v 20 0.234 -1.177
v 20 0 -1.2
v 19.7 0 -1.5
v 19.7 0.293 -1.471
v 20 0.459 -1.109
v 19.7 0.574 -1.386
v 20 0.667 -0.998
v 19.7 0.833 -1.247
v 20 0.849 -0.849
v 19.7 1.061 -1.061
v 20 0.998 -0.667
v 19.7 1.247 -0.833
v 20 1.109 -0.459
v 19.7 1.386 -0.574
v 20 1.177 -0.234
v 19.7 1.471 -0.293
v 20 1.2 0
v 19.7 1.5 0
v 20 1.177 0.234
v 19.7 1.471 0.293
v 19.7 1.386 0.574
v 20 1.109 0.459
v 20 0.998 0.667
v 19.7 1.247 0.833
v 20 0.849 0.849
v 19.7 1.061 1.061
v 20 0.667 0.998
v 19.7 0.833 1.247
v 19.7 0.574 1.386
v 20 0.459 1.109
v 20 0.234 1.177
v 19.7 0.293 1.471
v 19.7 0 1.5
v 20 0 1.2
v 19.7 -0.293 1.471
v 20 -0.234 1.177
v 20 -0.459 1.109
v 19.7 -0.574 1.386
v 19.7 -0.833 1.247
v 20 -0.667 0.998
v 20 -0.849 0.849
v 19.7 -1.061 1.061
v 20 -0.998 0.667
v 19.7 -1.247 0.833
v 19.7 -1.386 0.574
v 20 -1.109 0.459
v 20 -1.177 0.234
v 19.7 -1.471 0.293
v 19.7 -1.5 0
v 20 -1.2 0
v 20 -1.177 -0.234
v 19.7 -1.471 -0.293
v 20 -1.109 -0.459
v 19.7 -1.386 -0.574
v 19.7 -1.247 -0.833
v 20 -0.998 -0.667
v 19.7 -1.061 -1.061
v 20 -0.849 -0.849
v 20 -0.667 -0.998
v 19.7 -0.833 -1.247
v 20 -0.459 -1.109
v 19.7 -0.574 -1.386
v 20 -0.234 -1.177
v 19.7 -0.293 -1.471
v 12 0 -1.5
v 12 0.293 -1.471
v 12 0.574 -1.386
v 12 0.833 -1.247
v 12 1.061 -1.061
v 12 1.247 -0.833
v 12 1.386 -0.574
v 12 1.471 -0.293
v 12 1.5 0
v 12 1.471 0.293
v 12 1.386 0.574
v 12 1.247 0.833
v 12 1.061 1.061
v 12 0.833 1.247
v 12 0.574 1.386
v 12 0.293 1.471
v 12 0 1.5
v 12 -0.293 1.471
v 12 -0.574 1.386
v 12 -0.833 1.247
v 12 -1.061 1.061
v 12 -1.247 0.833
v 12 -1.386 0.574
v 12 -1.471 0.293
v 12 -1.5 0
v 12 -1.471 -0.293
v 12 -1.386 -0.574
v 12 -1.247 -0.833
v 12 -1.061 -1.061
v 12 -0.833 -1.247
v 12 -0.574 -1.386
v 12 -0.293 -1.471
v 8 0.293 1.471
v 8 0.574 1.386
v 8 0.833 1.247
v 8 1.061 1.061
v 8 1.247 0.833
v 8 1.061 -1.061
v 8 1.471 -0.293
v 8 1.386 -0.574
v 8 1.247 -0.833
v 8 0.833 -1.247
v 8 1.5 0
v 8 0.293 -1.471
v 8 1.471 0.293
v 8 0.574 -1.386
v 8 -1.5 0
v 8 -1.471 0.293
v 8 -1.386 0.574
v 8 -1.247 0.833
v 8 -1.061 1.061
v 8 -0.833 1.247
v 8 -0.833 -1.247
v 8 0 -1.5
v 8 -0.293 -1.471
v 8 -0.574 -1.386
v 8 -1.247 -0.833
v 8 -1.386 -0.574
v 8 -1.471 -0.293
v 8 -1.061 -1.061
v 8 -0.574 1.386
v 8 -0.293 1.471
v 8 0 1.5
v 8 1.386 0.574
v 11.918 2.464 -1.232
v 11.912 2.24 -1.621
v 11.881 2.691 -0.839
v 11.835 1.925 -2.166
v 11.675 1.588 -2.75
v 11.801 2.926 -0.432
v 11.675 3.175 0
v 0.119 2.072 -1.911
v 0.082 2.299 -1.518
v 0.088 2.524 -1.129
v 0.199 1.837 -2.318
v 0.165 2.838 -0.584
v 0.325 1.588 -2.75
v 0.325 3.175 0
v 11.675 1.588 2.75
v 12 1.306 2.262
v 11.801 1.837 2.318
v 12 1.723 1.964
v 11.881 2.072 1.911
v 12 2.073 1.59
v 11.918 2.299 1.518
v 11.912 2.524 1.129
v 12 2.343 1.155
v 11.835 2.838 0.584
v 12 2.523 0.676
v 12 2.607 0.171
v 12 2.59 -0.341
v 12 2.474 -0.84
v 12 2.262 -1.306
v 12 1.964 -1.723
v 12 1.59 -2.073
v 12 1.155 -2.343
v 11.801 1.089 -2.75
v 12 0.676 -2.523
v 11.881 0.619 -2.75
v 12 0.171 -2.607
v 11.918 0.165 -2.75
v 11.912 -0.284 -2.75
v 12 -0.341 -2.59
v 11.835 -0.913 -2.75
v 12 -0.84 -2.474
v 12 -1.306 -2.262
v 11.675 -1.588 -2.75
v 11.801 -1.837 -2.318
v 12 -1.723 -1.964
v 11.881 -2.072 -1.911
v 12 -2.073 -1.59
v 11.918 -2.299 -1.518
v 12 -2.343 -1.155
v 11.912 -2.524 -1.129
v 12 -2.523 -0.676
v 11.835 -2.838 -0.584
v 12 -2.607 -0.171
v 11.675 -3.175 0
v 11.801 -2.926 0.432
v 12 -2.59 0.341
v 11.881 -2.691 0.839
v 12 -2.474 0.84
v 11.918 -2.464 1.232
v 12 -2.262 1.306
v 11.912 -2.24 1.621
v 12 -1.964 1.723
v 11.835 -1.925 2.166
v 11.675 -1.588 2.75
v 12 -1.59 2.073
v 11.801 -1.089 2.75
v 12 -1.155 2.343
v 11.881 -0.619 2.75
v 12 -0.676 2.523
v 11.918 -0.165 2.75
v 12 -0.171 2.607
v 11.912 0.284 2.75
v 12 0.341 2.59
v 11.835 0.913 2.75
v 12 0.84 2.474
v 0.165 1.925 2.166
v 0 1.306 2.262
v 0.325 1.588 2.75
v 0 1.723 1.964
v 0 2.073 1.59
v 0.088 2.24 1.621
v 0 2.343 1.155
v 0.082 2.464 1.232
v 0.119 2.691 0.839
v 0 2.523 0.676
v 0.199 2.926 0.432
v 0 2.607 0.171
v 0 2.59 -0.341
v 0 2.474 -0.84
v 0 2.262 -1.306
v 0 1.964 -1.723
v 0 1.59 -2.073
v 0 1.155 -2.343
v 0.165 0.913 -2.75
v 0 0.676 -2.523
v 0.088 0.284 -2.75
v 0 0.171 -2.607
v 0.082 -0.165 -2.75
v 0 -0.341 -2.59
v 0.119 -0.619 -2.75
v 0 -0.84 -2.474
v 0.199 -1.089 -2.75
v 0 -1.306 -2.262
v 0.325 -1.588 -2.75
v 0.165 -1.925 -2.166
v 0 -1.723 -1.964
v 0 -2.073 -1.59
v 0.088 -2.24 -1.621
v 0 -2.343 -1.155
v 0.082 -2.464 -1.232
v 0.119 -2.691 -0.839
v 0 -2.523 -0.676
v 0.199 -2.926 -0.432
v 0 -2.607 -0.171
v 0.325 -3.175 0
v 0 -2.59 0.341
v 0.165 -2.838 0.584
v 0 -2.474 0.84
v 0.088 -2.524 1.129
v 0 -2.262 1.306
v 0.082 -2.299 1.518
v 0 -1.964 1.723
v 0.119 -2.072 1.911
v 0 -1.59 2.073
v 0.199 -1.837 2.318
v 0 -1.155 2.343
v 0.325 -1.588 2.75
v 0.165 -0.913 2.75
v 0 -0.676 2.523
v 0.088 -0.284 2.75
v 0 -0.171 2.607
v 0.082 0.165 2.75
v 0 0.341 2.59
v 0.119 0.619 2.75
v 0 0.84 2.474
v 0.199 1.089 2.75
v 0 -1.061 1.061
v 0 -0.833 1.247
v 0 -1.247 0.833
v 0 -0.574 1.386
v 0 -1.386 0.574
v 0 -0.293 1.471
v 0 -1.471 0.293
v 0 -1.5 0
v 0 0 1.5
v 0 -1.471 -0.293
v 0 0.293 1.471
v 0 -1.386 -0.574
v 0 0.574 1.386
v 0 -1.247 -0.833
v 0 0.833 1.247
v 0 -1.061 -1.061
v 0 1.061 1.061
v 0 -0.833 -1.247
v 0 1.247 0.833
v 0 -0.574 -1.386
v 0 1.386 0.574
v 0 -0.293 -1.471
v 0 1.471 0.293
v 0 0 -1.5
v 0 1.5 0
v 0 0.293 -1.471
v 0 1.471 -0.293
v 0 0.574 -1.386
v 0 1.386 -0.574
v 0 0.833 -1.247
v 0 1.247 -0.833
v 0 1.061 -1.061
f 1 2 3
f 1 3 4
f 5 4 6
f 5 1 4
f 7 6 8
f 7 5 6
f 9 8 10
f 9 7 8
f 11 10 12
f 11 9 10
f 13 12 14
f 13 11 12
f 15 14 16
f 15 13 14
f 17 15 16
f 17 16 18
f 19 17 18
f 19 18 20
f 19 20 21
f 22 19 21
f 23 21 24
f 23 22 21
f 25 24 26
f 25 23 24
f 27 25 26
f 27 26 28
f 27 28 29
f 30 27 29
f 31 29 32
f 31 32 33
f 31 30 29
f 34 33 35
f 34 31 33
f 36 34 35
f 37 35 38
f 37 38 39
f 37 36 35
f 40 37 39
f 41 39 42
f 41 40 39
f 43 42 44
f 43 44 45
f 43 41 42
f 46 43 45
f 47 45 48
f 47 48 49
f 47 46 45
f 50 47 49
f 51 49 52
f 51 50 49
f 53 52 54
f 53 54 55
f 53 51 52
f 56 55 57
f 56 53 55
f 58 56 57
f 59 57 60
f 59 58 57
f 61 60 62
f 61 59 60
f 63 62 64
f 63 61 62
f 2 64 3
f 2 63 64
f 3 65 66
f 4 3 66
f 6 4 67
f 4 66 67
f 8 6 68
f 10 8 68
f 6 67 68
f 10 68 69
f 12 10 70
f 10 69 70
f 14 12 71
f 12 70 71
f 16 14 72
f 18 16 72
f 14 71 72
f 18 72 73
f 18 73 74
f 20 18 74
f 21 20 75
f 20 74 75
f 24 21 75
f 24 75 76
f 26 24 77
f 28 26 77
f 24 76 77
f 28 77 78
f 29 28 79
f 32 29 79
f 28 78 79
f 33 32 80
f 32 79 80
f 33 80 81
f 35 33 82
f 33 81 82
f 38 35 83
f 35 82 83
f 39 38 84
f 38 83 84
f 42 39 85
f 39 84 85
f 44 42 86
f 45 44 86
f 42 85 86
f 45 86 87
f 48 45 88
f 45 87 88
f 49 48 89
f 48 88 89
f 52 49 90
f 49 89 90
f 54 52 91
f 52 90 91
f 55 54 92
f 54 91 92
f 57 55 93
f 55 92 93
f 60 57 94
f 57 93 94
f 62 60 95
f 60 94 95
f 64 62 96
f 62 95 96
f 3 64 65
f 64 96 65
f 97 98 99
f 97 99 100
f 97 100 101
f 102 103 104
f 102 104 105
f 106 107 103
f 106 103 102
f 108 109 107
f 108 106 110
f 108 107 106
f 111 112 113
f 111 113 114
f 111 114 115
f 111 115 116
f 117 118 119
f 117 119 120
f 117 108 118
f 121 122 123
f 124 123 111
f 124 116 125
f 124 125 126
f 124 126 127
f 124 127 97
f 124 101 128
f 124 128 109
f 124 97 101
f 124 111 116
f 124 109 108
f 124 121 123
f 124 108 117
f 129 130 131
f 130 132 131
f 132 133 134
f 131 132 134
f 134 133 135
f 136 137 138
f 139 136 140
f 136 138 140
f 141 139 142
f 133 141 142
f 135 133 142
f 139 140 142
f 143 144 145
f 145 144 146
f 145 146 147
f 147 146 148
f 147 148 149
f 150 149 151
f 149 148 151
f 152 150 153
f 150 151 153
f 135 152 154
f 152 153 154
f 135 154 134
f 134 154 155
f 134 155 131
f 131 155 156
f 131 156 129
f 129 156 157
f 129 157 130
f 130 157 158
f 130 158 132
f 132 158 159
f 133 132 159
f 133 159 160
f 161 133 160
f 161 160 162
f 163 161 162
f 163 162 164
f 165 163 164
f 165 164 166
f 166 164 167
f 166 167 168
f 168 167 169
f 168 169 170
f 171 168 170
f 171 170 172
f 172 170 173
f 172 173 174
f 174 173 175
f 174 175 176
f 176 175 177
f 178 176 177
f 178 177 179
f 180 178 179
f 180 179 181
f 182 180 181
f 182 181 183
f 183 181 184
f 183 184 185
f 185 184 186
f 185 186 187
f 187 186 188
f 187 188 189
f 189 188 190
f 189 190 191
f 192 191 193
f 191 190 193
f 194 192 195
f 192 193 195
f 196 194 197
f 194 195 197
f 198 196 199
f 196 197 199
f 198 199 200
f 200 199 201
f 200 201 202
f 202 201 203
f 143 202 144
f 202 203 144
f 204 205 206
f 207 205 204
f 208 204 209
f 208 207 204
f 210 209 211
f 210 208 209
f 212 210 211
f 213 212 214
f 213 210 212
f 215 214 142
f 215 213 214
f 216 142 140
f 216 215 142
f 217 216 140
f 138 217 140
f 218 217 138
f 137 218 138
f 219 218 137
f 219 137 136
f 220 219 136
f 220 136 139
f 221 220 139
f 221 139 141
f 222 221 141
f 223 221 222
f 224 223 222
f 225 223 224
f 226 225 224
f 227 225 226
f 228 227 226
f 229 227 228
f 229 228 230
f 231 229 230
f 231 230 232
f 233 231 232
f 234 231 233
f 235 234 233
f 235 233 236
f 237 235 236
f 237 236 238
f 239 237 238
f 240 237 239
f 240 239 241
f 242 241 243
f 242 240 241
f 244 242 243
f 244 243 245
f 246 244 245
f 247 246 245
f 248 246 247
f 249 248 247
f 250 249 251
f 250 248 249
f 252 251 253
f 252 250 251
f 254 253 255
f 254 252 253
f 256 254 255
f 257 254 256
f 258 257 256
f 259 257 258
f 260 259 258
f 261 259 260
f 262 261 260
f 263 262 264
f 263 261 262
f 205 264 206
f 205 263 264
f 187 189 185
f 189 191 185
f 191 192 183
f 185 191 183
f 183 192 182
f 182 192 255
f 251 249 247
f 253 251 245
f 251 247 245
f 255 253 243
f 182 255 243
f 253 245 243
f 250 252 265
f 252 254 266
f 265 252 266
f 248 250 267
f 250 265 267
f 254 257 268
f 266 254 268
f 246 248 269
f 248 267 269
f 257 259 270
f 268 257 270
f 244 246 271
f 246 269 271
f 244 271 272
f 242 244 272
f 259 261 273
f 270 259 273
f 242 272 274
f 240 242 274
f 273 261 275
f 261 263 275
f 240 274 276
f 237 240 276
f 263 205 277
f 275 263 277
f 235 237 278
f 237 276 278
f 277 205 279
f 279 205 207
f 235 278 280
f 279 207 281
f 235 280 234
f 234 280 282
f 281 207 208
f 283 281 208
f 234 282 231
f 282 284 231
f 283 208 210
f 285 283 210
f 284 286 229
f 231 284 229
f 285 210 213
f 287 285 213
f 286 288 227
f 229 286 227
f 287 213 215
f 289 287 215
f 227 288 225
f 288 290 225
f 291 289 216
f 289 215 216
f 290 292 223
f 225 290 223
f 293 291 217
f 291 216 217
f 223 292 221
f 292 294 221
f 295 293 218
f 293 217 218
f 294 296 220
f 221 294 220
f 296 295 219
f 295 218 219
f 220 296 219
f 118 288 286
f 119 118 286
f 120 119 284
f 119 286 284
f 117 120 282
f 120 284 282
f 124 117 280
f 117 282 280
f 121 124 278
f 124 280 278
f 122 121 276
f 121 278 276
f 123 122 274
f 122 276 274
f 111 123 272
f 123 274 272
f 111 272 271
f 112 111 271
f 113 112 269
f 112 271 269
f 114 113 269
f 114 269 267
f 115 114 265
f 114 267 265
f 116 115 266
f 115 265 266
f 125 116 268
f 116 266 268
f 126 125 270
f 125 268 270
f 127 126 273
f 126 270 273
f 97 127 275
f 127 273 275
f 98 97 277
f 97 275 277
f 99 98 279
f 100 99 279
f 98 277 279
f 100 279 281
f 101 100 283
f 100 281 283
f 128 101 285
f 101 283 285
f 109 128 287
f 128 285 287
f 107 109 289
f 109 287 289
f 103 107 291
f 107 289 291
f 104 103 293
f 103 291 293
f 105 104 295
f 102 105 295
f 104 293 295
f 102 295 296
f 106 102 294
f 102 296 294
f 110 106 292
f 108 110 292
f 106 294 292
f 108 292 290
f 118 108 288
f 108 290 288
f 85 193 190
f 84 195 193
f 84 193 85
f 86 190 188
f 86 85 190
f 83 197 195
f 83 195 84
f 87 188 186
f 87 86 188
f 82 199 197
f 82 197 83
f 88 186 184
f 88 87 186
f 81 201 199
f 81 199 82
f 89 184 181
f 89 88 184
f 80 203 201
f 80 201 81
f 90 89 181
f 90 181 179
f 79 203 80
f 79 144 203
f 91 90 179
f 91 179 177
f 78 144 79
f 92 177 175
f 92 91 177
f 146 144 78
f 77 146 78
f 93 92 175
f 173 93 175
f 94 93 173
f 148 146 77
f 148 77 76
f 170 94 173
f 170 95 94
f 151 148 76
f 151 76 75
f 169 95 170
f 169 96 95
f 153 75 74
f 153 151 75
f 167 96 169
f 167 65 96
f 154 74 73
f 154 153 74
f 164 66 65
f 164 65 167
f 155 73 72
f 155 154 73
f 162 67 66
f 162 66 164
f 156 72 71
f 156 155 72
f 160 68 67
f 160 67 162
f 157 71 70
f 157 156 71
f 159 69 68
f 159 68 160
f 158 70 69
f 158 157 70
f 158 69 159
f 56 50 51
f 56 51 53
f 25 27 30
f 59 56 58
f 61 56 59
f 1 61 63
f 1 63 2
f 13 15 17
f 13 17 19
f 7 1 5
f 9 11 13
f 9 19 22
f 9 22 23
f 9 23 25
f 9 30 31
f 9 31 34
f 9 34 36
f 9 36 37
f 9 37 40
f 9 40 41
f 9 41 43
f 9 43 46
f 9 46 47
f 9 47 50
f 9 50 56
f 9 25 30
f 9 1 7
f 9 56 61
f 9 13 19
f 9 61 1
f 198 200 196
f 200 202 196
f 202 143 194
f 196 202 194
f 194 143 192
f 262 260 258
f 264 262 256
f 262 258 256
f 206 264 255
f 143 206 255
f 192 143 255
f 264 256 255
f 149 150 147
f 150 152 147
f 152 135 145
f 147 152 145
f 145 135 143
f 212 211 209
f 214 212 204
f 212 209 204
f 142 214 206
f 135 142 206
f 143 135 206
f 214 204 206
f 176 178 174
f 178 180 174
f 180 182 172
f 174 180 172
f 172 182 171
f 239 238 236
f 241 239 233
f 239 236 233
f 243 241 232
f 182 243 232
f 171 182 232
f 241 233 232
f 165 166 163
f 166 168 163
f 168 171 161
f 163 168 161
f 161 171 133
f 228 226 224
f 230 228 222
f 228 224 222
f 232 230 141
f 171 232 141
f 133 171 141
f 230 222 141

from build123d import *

# Parameters (mm, degrees)
BOSS_EXTRUDE1_DEPTH = 12
SKETCH2_R           = 1.5
BOSS_EXTRUDE2_DEPTH = 8
SKETCH3_R           = 1.5
CUT_EXTRUDE1_DEPTH  = 8
CHAMFER1_SIZE       = 0.3


with BuildPart() as part:
    # Sketch1 → Boss-Extrude1 (new body)
    with BuildSketch(Plane(origin=(0, 0, 0), x_dir=(0, 0, -1), z_dir=(1, 0, 0))):
        Polygon((0, 3.175426481), (-2.75, 1.58771324), (-2.75, -1.58771324), (0, -3.175426481), (2.75, -1.58771324), (2.75, 1.58771324), align=None)
    extrude(amount=BOSS_EXTRUDE1_DEPTH)

    # Sketch2 → Boss-Extrude2 (add)
    with BuildSketch(Plane(origin=(12, 0, 0), x_dir=(0, 0, -1), z_dir=(1, 0, 0))):
        Circle(SKETCH2_R)
    extrude(amount=BOSS_EXTRUDE2_DEPTH)

    # Sketch3 → Cut-Extrude1 (cut)
    with BuildSketch(Plane.ZY):
        with Locations(Location((0, 0, 0), (0, 0, 180))):
            Circle(SKETCH3_R)
    extrude(amount=-CUT_EXTRUDE1_DEPTH, mode=Mode.SUBTRACT)

    # Sketch4 → Cut-Revolve1 (revolve, cut)
    with BuildSketch(Plane(origin=(0, 0, 0), x_dir=(1, 0, 0), z_dir=(0, 1, 0)), mode=Mode.PRIVATE) as cut_revolve1_sk:
        Polygon((0, 10.219809024), (4.392081913, 10.219809024), (0, 2.6125), align=None)
        Polygon((12, 2.6125), (12, 10.219809024), (7.607918087, 10.219809024), align=None)
    revolve(cut_revolve1_sk.sketch.rotate(Axis((0, 0, 0), (-1, 0, 0)), 210.000000006), axis=Axis((0, 0, 0), (-1, 0, 0)), mode=Mode.SUBTRACT)

    # Chamfer1
    chamfer1_edges = [part.edges().sort_by_distance(p)[0] for p in [
        (20, 0, 1.5),
    ]]
    chamfer(chamfer1_edges, length=CHAMFER1_SIZE)


solid = part.part
